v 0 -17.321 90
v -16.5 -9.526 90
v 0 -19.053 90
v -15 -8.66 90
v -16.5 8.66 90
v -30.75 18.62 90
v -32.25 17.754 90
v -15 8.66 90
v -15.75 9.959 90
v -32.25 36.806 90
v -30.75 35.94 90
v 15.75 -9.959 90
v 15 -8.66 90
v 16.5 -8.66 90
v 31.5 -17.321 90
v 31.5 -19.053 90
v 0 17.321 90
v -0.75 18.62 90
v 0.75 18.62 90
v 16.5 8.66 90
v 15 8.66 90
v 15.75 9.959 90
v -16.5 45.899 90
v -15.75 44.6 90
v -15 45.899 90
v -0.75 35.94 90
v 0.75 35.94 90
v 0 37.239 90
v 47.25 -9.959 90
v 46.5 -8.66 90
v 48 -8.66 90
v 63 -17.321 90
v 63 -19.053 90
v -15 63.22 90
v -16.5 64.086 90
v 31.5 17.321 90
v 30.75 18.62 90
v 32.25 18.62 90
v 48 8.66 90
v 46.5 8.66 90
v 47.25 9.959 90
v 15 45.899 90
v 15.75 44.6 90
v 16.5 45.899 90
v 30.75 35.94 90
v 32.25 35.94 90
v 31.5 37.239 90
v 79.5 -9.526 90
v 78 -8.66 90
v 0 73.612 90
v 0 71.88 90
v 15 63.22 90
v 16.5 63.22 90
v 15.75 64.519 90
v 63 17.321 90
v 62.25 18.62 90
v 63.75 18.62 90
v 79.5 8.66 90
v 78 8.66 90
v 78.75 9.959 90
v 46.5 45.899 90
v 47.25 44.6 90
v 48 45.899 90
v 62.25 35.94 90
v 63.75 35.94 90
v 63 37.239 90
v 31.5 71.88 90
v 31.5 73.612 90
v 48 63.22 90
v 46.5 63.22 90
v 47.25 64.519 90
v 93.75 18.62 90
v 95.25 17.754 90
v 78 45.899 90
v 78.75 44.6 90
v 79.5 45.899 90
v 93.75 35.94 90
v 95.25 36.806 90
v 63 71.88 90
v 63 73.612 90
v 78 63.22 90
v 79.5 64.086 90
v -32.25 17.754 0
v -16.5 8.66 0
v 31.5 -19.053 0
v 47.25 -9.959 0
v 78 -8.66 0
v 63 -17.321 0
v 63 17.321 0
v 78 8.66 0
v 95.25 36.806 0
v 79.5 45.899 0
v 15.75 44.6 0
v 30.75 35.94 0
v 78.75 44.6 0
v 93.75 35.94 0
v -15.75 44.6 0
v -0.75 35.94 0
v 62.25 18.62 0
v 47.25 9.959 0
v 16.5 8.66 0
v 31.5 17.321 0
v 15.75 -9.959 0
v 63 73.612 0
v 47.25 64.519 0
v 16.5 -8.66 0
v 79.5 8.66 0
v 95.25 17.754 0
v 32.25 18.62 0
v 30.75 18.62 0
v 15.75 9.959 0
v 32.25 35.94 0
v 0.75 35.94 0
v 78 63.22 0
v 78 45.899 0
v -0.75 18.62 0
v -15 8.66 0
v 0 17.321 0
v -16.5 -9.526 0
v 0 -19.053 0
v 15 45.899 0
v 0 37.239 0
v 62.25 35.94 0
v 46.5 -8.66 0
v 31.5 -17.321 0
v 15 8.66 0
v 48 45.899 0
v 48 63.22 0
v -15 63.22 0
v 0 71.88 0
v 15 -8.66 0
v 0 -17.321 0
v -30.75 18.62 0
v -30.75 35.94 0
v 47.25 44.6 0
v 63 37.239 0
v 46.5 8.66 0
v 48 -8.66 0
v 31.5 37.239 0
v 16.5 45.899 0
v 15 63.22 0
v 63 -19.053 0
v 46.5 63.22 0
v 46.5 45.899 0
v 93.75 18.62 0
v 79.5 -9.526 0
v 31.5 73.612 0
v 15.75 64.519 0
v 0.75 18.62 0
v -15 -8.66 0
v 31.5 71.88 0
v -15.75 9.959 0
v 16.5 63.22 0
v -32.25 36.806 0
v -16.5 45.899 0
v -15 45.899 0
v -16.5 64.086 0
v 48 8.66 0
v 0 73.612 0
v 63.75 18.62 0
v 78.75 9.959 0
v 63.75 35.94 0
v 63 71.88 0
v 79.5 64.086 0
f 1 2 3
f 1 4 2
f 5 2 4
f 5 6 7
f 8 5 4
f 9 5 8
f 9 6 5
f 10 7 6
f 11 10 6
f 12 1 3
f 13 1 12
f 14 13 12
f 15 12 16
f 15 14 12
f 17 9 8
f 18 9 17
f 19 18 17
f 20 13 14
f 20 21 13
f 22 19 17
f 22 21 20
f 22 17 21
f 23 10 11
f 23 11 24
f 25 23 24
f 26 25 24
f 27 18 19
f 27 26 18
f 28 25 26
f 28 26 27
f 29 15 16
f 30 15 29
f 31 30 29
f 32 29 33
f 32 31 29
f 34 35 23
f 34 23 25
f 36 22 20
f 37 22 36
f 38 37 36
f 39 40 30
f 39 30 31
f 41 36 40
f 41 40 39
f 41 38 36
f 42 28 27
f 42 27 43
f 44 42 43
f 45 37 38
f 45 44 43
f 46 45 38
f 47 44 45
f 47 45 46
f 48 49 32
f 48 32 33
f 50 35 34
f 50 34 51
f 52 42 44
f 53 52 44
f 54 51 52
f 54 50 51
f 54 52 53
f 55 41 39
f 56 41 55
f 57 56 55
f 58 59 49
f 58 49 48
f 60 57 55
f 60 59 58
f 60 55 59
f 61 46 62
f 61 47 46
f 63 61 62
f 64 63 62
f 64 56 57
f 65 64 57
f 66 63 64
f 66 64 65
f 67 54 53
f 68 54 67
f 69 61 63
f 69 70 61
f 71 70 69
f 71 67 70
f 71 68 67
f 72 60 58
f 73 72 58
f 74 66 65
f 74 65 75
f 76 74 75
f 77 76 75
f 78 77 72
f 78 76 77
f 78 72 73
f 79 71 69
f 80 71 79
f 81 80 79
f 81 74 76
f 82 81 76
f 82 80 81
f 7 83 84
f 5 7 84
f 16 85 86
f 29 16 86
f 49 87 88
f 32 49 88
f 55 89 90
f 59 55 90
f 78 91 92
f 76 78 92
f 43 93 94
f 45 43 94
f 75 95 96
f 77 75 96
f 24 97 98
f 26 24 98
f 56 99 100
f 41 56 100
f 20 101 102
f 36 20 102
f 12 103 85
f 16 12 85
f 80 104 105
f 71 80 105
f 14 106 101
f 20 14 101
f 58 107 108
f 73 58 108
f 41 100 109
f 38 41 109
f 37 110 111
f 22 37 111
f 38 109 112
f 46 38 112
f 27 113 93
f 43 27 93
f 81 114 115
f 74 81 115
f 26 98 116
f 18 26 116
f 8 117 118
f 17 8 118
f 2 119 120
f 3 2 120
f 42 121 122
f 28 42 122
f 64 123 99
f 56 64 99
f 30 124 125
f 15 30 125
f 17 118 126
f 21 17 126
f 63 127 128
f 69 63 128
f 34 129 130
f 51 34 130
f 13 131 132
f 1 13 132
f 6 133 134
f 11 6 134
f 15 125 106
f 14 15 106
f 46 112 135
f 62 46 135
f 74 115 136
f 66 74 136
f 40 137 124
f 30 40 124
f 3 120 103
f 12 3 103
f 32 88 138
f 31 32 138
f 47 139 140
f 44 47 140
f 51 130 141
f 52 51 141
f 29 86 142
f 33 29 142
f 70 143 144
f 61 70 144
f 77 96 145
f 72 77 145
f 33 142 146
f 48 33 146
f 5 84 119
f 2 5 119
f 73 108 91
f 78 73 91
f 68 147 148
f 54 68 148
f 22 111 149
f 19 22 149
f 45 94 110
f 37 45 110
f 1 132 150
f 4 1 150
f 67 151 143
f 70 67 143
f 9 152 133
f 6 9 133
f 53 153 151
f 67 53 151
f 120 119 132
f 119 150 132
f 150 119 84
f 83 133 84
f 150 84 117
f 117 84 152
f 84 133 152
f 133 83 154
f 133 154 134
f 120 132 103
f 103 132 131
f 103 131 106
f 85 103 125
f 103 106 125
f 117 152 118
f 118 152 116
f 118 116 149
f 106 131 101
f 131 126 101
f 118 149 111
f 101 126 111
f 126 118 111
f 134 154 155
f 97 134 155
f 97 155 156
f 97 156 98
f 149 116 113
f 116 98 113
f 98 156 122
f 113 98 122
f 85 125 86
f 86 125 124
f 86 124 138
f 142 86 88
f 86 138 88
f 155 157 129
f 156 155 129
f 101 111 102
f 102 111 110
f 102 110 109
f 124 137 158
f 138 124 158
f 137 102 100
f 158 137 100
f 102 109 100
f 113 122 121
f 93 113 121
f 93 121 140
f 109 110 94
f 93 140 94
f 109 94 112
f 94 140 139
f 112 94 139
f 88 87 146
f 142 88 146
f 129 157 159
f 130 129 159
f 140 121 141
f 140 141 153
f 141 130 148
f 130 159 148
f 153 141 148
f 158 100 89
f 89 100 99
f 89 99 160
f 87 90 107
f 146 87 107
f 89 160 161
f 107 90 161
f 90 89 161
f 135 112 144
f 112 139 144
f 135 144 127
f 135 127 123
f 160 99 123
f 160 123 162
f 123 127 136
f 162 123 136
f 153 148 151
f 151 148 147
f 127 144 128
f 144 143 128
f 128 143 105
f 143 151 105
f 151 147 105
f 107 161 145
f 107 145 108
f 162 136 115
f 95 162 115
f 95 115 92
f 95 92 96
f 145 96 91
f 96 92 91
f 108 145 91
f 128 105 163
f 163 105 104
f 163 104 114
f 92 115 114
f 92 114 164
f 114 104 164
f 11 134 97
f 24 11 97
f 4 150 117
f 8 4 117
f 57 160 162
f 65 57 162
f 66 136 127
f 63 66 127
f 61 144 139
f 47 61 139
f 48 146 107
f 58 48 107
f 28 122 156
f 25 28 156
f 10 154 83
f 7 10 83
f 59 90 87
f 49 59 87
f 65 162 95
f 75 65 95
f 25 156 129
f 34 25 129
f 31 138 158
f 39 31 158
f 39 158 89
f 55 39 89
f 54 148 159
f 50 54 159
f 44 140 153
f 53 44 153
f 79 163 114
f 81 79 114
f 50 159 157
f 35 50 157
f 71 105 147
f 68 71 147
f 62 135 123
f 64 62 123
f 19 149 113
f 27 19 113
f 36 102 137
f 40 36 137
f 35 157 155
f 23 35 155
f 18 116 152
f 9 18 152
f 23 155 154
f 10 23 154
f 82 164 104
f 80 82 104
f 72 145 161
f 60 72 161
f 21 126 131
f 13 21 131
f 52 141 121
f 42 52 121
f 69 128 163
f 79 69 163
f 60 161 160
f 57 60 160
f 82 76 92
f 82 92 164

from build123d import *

# Parameters (mm, degrees)
F2_DEPTH = 90


with BuildPart() as f2:
    # F0 (on Top) → F2 (new body)
    with BuildSketch(Plane.XY):
        Polygon((0.75, 17.7535207776), (0, 17.3205080757), (15, 8.6602540378), (15, 9.5262794416), (15.75, 9.9592921435), (0.75, 18.6195461814), align=None)
        Polygon((-0.75, 17.7535207776), (0, 17.3205080757), (0.75, 17.7535207776), (0.75, 18.6195461814), (0, 19.0525588833), (-0.75, 18.6195461814), align=None)
        Polygon((-15, 8.6602540378), (0, 17.3205080757), (-0.75, 17.7535207776), (-0.75, 18.6195461814), (-15.75, 9.9592921435), (-16.5, 9.5262794416), (-16.5, 8.6602540378), (-15.75, 8.227241336), align=None)
        Polygon((15.75, 8.227241336), (15, 8.6602540378), (15, -8.6602540378), (15, -9.5262794416), (15.75, -9.9592921435), (16.5, -9.5262794416), (16.5, -8.6602540378), (16.5, 8.6602540378), align=None)
        Polygon((15, 9.5262794416), (15, 8.6602540378), (15.75, 8.227241336), (16.5, 8.6602540378), (16.5, 9.5262794416), (15.75, 9.9592921435), align=None)
        Polygon((-15, -8.6602540378), (-15, 8.6602540378), (-15.75, 8.227241336), (-16.5, 8.6602540378), (-16.5, -9.5262794416), (0, -19.0525588833), (15.75, -9.9592921435), (15, -9.5262794416), (15, -8.6602540378), (0, -17.3205080757), align=None)
        Polygon((0, 19.0525588833), (0.75, 18.6195461814), (0.75, 35.9400542571), (0, 35.5070415552), (-0.75, 35.9400542571), (-0.75, 18.6195461814), align=None)
        Polygon((30.75, 18.6195461814), (15.75, 9.9592921435), (16.5, 9.5262794416), (16.5, 8.6602540378), (31.5, 17.3205080757), (30.75, 17.7535207776), align=None)
        Polygon((-32.25, 17.7535207776), (-16.5, 8.6602540378), (-16.5, 9.5262794416), (-15.75, 9.9592921435), (-30.75, 18.6195461814), (-30.75, 35.9400542571), (-15.75, 44.6003082949), (-16.5, 45.0333209968), (-16.5, 45.8993464006), (-32.25, 36.8060796608), align=None)
        Polygon((0, 35.5070415552), (0.75, 35.9400542571), (0.75, 36.8060796608), (0, 37.2390923627), (-0.75, 36.8060796608), (-0.75, 35.9400542571), align=None)
        Polygon((0.75, 36.8060796608), (0.75, 35.9400542571), (15.75, 44.6003082949), (15, 45.0333209968), (15, 45.8993464006), (0, 37.2390923627), align=None)
        Polygon((-15.75, 44.6003082949), (-0.75, 35.9400542571), (-0.75, 36.8060796608), (0, 37.2390923627), (-15, 45.8993464006), (-15.75, 46.3323591025), (-16.5, 45.8993464006), (-16.5, 45.0333209968), align=None)
        Polygon((16.5, -9.5262794416), (15.75, -9.9592921435), (31.5, -19.0525588833), (47.25, -9.9592921435), (46.5, -9.5262794416), (46.5, -8.6602540378), (31.5, -17.3205080757), (16.5, -8.6602540378), align=None)
        Polygon((30.75, 35.9400542571), (30.75, 18.6195461814), (31.5, 19.0525588833), (32.25, 18.6195461814), (32.25, 35.9400542571), (31.5, 35.5070415552), align=None)
        Polygon((31.5, 19.0525588833), (30.75, 18.6195461814), (30.75, 17.7535207776), (31.5, 17.3205080757), (32.25, 17.7535207776), (32.25, 18.6195461814), align=None)
        Polygon((32.25, 17.7535207776), (31.5, 17.3205080757), (46.5, 8.6602540378), (46.5, 9.5262794416), (47.25, 9.9592921435), (32.25, 18.6195461814), align=None)
        Polygon((16.5, 45.0333209968), (15.75, 44.6003082949), (30.75, 35.9400542571), (30.75, 36.8060796608), (31.5, 37.2390923627), (16.5, 45.8993464006), align=None)
        Polygon((15, 45.0333209968), (15.75, 44.6003082949), (16.5, 45.0333209968), (16.5, 45.8993464006), (15.75, 46.3323591025), (15, 45.8993464006), align=None)
        Polygon((30.75, 36.8060796608), (30.75, 35.9400542571), (31.5, 35.5070415552), (32.25, 35.9400542571), (32.25, 36.8060796608), (31.5, 37.2390923627), align=None)
        Polygon((47.25, 8.227241336), (46.5, 8.6602540378), (46.5, -8.6602540378), (46.5, -9.5262794416), (47.25, -9.9592921435), (48, -9.5262794416), (48, -8.6602540378), (48, 8.6602540378), align=None)
        Polygon((46.5, 9.5262794416), (46.5, 8.6602540378), (47.25, 8.227241336), (48, 8.6602540378), (48, 9.5262794416), (47.25, 9.9592921435), align=None)
        Polygon((48, -9.5262794416), (47.25, -9.9592921435), (63, -19.0525588833), (79.5, -9.5262794416), (79.5, 8.6602540378), (78.75, 8.227241336), (78, 8.6602540378), (78, -8.6602540378), (63, -17.3205080757), (48, -8.6602540378), align=None)
        Polygon((-16.5, 64.08587988), (-16.5, 45.8993464006), (-15.75, 46.3323591025), (-15, 45.8993464006), (-15, 63.2198544763), (0, 71.8801085141), (15, 63.2198544763), (15, 64.08587988), (15.75, 64.5188925819), (0, 73.6121593217), align=None)
        Polygon((15, 63.2198544763), (15, 45.8993464006), (15.75, 46.3323591025), (16.5, 45.8993464006), (16.5, 63.2198544763), (16.5, 64.08587988), (15.75, 64.5188925819), (15, 64.08587988), align=None)
        Polygon((62.25, 18.6195461814), (47.25, 9.9592921435), (48, 9.5262794416), (48, 8.6602540378), (63, 17.3205080757), (62.25, 17.7535207776), align=None)
        Polygon((32.25, 36.8060796608), (32.25, 35.9400542571), (47.25, 44.6003082949), (46.5, 45.0333209968), (46.5, 45.8993464006), (31.5, 37.2390923627), align=None)
        Polygon((16.5, 64.08587988), (16.5, 63.2198544763), (31.5, 71.8801085141), (46.5, 63.2198544763), (46.5, 64.08587988), (47.25, 64.5188925819), (31.5, 73.6121593217), (15.75, 64.5188925819), align=None)
        Polygon((62.25, 35.9400542571), (62.25, 18.6195461814), (63, 19.0525588833), (63.75, 18.6195461814), (63.75, 35.9400542571), (63, 35.5070415552), align=None)
        Polygon((63, 19.0525588833), (62.25, 18.6195461814), (62.25, 17.7535207776), (63, 17.3205080757), (63.75, 17.7535207776), (63.75, 18.6195461814), align=None)
        Polygon((48, 45.0333209968), (47.25, 44.6003082949), (62.25, 35.9400542571), (62.25, 36.8060796608), (63, 37.2390923627), (48, 45.8993464006), align=None)
        Polygon((46.5, 45.0333209968), (47.25, 44.6003082949), (48, 45.0333209968), (48, 45.8993464006), (47.25, 46.3323591025), (46.5, 45.8993464006), align=None)
        Polygon((46.5, 63.2198544763), (46.5, 45.8993464006), (47.25, 46.3323591025), (48, 45.8993464006), (48, 63.2198544763), (48, 64.08587988), (47.25, 64.5188925819), (46.5, 64.08587988), align=None)
        Polygon((63.75, 17.7535207776), (63, 17.3205080757), (78, 8.6602540378), (78.75, 8.227241336), (79.5, 8.6602540378), (79.5, 9.5262794416), (78.75, 9.9592921435), (63.75, 18.6195461814), align=None)
        Polygon((79.5, 9.5262794416), (79.5, 8.6602540378), (95.25, 17.7535207776), (95.25, 36.8060796608), (79.5, 45.8993464006), (79.5, 45.0333209968), (78.75, 44.6003082949), (93.75, 35.9400542571), (93.75, 18.6195461814), (78.75, 9.9592921435), align=None)
        Polygon((62.25, 36.8060796608), (62.25, 35.9400542571), (63, 35.5070415552), (63.75, 35.9400542571), (63.75, 36.8060796608), (63, 37.2390923627), align=None)
        Polygon((63.75, 36.8060796608), (63.75, 35.9400542571), (78.75, 44.6003082949), (79.5, 45.0333209968), (79.5, 45.8993464006), (78.75, 46.3323591025), (78, 45.8993464006), (63, 37.2390923627), align=None)
        Polygon((48, 64.08587988), (48, 63.2198544763), (63, 71.8801085141), (78, 63.2198544763), (78, 45.8993464006), (78.75, 46.3323591025), (79.5, 45.8993464006), (79.5, 64.08587988), (63, 73.6121593217), (47.25, 64.5188925819), align=None)
    extrude(amount=F2_DEPTH)


solid = f2.part
